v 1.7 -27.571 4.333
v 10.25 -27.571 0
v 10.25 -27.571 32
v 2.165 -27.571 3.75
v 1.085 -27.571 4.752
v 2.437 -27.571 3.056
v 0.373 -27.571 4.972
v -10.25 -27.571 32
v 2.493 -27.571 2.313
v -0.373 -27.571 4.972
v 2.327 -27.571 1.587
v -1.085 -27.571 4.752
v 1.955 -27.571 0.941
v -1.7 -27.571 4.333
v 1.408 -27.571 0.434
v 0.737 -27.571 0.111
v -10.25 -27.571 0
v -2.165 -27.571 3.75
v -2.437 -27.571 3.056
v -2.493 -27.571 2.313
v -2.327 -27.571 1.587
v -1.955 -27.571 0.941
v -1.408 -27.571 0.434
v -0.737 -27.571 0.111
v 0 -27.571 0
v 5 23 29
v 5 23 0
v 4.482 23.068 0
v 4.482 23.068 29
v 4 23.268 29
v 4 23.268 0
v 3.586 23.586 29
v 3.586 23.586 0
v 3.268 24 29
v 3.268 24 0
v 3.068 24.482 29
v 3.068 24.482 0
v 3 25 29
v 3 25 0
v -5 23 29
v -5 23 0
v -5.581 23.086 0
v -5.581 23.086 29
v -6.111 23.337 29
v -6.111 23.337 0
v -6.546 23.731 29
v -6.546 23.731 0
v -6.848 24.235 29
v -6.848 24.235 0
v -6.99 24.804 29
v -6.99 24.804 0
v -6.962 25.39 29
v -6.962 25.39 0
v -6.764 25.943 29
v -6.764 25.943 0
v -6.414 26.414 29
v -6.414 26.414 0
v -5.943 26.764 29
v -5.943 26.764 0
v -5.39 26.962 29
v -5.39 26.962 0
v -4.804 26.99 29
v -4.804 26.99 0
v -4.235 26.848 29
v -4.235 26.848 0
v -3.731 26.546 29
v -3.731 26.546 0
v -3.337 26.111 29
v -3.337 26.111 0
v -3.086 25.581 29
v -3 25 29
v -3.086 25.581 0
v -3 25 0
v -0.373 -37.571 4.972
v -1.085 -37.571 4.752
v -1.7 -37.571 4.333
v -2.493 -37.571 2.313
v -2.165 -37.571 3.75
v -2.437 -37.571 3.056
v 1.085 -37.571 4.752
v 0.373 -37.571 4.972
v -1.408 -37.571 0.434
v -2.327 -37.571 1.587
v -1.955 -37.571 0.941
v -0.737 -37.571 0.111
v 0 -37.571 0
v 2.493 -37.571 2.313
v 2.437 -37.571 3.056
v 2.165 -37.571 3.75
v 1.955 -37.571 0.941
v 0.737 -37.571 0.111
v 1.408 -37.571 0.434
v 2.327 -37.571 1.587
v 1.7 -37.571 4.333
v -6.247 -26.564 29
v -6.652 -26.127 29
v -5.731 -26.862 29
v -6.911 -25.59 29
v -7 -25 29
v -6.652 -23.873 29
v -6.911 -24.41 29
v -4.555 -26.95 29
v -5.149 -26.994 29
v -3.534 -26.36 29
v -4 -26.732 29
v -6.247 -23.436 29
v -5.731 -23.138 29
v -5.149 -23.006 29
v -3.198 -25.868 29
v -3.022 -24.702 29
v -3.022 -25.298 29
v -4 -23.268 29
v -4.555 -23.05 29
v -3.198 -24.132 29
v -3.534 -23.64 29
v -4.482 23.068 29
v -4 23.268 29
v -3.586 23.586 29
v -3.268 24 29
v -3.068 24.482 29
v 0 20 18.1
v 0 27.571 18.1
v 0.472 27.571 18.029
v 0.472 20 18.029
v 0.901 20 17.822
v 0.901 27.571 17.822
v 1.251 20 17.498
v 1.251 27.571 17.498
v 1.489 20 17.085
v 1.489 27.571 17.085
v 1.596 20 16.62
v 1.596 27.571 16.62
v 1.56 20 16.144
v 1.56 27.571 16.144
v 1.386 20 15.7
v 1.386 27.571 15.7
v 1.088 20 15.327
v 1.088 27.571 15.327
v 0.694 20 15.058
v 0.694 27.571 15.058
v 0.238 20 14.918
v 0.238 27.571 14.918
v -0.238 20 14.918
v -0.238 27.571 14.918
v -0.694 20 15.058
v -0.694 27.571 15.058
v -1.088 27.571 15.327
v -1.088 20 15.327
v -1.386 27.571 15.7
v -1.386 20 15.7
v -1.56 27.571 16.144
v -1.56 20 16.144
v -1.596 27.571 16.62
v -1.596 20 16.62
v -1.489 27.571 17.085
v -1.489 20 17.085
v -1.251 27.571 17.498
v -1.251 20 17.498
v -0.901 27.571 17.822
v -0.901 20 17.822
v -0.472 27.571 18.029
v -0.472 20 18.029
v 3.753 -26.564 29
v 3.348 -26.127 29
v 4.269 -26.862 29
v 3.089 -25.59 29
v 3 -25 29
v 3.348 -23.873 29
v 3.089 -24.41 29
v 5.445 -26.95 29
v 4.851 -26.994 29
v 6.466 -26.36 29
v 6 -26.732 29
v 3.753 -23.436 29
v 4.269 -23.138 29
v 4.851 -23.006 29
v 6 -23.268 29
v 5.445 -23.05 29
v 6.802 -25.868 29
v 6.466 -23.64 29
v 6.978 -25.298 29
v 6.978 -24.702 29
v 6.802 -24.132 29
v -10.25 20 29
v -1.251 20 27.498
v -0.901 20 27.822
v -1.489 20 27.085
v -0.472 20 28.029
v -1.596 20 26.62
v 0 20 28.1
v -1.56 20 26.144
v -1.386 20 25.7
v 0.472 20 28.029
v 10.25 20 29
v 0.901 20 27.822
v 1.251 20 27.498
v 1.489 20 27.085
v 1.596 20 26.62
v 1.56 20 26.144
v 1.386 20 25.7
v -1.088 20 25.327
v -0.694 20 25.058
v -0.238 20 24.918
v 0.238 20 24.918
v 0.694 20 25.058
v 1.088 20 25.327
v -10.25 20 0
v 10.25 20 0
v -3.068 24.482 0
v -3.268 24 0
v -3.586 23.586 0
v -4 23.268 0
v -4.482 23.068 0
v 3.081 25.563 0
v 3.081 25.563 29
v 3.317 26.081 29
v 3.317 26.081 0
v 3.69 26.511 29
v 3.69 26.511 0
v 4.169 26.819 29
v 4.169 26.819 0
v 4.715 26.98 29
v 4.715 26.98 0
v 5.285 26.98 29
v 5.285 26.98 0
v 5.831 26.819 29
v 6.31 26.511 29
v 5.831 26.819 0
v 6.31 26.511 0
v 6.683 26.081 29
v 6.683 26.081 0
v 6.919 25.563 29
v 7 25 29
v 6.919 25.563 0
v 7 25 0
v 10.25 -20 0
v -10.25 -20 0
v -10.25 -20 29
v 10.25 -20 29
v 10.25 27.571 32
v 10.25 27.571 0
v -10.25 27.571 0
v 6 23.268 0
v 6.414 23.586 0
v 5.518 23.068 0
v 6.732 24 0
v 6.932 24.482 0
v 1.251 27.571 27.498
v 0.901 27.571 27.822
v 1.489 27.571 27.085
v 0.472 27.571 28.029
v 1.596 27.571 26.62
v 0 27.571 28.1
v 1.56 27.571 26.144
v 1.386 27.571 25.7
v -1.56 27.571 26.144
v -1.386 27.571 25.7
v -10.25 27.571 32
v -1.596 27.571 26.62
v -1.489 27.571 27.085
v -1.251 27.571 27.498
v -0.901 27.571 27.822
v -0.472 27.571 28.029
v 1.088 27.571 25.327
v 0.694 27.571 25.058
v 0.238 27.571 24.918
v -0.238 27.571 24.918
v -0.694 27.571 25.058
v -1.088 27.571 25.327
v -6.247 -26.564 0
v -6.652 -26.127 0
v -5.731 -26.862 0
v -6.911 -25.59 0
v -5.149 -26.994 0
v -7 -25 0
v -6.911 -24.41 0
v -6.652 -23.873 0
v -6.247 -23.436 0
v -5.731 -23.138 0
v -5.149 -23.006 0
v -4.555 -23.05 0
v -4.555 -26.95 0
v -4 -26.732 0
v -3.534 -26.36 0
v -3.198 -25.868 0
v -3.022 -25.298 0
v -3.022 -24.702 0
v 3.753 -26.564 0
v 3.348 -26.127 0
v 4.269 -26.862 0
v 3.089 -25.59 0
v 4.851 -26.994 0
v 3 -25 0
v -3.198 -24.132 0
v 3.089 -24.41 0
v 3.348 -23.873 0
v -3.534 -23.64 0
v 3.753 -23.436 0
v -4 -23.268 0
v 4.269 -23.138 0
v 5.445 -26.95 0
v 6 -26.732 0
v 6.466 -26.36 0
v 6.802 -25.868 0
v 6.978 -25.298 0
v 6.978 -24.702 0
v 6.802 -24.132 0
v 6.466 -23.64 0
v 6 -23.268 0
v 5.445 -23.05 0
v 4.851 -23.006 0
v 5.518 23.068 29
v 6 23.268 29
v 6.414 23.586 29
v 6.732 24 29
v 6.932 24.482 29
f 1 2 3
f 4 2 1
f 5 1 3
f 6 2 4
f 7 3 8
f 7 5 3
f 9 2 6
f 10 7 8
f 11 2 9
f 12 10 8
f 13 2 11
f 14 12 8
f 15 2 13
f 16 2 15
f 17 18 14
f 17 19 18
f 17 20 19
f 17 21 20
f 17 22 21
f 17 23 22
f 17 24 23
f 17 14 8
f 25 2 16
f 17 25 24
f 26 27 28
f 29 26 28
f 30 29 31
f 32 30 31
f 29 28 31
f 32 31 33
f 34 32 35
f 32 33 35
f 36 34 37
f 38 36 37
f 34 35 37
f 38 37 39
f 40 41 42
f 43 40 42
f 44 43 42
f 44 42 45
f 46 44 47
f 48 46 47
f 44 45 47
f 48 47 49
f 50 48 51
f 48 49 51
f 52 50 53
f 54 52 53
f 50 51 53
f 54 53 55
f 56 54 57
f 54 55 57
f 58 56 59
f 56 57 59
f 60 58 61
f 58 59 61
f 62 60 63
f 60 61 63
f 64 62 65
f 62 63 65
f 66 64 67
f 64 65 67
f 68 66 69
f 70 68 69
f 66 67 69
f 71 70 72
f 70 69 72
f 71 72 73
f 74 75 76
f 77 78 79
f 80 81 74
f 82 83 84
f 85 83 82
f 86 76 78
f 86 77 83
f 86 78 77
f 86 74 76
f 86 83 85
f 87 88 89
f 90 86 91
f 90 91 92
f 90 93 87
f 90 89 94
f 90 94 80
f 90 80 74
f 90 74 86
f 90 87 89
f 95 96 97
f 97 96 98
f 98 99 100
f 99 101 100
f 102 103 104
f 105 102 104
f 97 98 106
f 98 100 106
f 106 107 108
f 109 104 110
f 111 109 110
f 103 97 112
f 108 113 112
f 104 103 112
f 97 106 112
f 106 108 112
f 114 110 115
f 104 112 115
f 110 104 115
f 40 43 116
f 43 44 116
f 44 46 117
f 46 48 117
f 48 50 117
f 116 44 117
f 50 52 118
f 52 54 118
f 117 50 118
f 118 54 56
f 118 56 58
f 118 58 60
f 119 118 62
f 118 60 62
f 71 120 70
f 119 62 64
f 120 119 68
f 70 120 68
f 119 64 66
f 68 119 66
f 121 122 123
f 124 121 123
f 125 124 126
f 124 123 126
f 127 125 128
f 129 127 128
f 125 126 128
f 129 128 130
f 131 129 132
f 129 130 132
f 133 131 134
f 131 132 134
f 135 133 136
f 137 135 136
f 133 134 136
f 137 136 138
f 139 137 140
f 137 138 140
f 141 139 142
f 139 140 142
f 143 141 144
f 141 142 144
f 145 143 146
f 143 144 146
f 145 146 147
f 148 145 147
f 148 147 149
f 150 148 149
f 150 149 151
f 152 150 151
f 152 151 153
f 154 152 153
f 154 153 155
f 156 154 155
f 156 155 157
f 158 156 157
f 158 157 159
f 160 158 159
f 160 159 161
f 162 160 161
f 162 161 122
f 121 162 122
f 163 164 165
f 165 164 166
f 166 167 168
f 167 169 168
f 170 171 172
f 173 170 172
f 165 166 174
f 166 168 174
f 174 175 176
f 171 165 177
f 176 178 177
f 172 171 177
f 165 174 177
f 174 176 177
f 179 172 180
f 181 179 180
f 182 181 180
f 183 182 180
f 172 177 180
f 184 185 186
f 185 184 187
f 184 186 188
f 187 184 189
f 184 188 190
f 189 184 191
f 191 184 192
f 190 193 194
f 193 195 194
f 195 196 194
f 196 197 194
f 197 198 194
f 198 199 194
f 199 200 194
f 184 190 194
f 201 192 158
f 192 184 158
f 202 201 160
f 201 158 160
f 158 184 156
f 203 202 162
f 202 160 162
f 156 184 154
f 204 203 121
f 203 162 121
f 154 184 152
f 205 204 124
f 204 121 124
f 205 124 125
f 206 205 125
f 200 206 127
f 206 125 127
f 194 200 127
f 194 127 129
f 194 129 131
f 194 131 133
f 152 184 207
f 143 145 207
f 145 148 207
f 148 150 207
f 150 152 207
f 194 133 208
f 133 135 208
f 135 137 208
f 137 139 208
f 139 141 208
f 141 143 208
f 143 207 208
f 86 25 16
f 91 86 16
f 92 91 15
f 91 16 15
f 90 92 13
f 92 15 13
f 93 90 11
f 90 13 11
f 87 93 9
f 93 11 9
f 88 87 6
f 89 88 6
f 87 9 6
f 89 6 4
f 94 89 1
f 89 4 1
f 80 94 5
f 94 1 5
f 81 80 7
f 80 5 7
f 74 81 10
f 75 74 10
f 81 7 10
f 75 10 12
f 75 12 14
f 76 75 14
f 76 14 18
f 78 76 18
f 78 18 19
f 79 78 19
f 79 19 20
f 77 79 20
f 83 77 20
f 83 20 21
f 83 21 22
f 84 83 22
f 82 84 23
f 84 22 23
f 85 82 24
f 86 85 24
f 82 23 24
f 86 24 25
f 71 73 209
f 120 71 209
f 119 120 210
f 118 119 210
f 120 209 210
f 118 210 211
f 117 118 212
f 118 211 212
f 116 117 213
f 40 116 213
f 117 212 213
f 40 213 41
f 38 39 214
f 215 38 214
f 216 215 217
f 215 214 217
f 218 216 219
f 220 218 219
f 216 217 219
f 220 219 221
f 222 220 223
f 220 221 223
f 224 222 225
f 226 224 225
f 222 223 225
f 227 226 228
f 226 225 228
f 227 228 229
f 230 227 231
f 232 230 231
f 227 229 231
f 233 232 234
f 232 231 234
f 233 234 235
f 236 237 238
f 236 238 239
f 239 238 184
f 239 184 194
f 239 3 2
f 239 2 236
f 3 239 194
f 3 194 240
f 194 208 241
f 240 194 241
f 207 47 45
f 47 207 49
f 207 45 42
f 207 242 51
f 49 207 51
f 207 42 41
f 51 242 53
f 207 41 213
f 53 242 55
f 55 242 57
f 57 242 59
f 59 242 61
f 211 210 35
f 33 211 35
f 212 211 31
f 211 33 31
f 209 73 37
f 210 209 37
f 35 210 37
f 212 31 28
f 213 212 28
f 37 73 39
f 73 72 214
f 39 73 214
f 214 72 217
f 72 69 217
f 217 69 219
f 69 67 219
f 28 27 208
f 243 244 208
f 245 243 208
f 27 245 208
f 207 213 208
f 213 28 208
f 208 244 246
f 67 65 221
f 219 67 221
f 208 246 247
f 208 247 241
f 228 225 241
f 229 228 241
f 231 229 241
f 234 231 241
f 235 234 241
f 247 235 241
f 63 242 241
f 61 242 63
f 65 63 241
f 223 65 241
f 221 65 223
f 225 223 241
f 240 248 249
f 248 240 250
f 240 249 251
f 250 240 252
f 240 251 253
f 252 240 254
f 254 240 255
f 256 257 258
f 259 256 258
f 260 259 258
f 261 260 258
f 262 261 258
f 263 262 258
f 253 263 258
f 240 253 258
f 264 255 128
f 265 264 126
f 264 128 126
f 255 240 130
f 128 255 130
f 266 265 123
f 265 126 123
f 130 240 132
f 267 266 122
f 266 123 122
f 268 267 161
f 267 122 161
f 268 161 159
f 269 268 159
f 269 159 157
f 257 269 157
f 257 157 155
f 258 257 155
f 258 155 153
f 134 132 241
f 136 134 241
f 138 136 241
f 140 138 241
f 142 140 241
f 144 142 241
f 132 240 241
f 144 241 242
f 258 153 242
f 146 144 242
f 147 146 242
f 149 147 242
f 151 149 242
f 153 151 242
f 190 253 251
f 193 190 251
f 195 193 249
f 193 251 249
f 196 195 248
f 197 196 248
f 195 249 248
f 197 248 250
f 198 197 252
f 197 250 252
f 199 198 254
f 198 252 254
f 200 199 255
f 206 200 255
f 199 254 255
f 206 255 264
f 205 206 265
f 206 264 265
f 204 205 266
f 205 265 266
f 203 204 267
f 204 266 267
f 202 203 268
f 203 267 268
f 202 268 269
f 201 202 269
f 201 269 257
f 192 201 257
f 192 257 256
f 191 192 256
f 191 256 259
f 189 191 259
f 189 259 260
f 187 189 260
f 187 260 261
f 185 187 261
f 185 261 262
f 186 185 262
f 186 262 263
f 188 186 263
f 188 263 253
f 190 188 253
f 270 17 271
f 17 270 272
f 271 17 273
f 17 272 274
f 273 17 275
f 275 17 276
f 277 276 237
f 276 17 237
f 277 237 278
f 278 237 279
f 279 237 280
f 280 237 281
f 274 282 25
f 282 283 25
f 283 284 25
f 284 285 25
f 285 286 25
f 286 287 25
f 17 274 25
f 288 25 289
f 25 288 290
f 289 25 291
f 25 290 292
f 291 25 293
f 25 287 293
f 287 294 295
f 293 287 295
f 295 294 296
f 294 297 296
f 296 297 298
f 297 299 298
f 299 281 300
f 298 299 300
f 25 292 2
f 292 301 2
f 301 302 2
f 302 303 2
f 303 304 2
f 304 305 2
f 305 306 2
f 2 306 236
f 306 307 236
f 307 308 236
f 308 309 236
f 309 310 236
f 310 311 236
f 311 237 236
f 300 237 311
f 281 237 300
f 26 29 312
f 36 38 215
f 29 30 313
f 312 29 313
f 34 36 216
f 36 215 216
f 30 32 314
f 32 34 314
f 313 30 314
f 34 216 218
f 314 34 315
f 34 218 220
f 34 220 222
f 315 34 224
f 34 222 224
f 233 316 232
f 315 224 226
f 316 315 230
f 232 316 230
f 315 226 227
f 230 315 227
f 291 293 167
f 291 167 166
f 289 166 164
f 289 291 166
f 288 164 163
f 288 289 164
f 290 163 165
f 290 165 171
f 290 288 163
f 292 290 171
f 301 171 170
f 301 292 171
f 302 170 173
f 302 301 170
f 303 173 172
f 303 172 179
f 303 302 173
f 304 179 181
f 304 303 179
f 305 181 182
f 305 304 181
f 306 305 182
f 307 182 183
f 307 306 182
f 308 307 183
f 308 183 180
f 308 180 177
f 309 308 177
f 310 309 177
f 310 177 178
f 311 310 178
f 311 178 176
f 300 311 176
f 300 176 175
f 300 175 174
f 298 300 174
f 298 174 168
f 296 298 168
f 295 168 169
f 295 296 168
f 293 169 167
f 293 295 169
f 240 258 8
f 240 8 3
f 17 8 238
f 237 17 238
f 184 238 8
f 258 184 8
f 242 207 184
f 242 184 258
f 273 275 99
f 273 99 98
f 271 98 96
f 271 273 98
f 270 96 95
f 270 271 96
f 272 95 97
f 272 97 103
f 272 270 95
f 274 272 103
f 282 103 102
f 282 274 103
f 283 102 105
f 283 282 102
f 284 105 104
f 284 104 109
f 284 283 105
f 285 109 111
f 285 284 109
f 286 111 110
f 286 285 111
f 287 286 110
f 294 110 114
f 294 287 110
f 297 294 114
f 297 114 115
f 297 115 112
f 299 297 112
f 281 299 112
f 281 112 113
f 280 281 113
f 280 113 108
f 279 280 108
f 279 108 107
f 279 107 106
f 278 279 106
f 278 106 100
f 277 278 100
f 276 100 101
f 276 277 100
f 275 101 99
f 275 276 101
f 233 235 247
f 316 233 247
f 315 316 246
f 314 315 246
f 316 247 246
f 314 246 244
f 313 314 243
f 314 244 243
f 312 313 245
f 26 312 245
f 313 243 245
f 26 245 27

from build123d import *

# Parameters (mm, degrees)
SKETCH_1_W          = 20.5
SKETCH_1_H          = 15.141704846
SKETCH_1_R          = 2
EXTRUDE_1_DEPTH     = 29
SKETCH_2_W          = 20.5
SKETCH_2_H          = 70.283409692
EXTRUDE_2_DEPTH     = 3
SKETCH_3_W          = 20.5
SKETCH_3_H          = 7.570852423
CUT_EXTRUDE_1_DEPTH = 49.621002864
SKETCH_5_R          = 2.5
EXTRUDE_3_DEPTH     = 10
CUT_EXTRUDE_2_REACH = 75.297
SKETCH_8_R          = 1.6


with BuildPart() as part:
    # 草图1 → 凸台-拉伸1 (new body)
    # profile 1 of 3: a face of its own
    with BuildSketch(Plane.XY):
        with BuildLine():
            Line((-10.25, 35.141704846), (-10.25, 20))
            Line((-10.25, 20), (-5, 20))
            Line((-5, 20), (-5, 23))
            ThreePointArc((-5, 23), (-6.414213562, 26.414213562), (-3, 25))
            Line((-3, 25), (3, 25))
            ThreePointArc((3, 25), (5, 27), (7, 25))
            ThreePointArc((7, 25), (6.414213562, 23.585786438), (5, 23))
            Line((5, 23), (5, 20))
            Line((5, 20), (10.25, 20))
            Line((10.25, 20), (10.25, 35.141704846))
            Line((10.25, 35.141704846), (-10.25, 35.141704846))
        make_face()
    # profile 2 of 3: a face of its own
    with BuildSketch(Plane.XY):
        with Locations((0, -27.570852423)):
            Rectangle(SKETCH_1_W, SKETCH_1_H)
        with Locations(Location((-5, -25, 0), (0, 0, 180))):
            Circle(SKETCH_1_R, mode=Mode.SUBTRACT)
        with Locations(Location((5, -25, 0), (0, 0, 180))):
            Circle(SKETCH_1_R, mode=Mode.SUBTRACT)
    # profile 3 of 3: a face of its own
    with BuildSketch(Plane.XY):
        with BuildLine():
            Line((-5, 23), (-5, 20))
            Line((-5, 20), (5, 20))
            Line((5, 20), (5, 23))
            ThreePointArc((5, 23), (3.585786438, 23.585786438), (3, 25))
            Line((3, 25), (-3, 25))
            ThreePointArc((-3, 25), (-3.585786438, 23.585786438), (-5, 23))
        make_face()
    extrude(amount=EXTRUDE_1_DEPTH)

    # 草图2 → 凸台-拉伸2 (add)
    with BuildSketch(Plane.XY.offset(29)):
        Rectangle(SKETCH_2_W, SKETCH_2_H)
    extrude(amount=EXTRUDE_2_DEPTH)

    # 草图3 → 切除-拉伸1 (cut, through all)
    with BuildSketch(Plane(origin=(0, 0, 0), x_dir=(-1, 0, 0), z_dir=(0, 0, -1))):
        with Locations((0, -31.356278635)):
            Rectangle(SKETCH_3_W, SKETCH_3_H)
        with Locations((0, 31.356278635)):
            Rectangle(SKETCH_3_W, SKETCH_3_H)
    extrude(amount=-CUT_EXTRUDE_1_DEPTH, mode=Mode.SUBTRACT)

    # 草图5 → 凸台-拉伸3 (add)
    with BuildSketch(Plane.XZ.offset(27.570852423)):
        with Locations(Location((0, 2.5, 0), (0, 0, 270))):
            Circle(SKETCH_5_R)
    extrude(amount=EXTRUDE_3_DEPTH)

    # 草图8 → 切除-拉伸2 (cut, up to next)
    with BuildSketch(Plane(origin=(0, 27.570852423, 0), x_dir=(1, 0, 0), z_dir=(0, 1, 0)), mode=Mode.PRIVATE) as cut_extrude_2_sk1:
        with Locations(Location((0, -16.5, 0), (0, 0, 270))):
            Circle(SKETCH_8_R)
    cut_extrude_2_tool1 = extrude(cut_extrude_2_sk1.sketch, amount=-CUT_EXTRUDE_2_REACH, mode=Mode.PRIVATE) & part.part
    # 草图8 → 切除-拉伸2 (cut, up to next)
    with BuildSketch(Plane(origin=(0, 27.570852423, 0), x_dir=(1, 0, 0), z_dir=(0, 1, 0)), mode=Mode.PRIVATE) as cut_extrude_2_sk2:
        with Locations(Location((0, -26.5, 0), (0, 0, 270))):
            Circle(SKETCH_8_R)
    cut_extrude_2_tool2 = extrude(cut_extrude_2_sk2.sketch, amount=-CUT_EXTRUDE_2_REACH, mode=Mode.PRIVATE) & part.part
    add(cut_extrude_2_tool1.solids().sort_by_distance((0, 27.570852, 16.5))[0], mode=Mode.SUBTRACT)
    add(cut_extrude_2_tool2.solids().sort_by_distance((0, 27.570852, 26.5))[0], mode=Mode.SUBTRACT)


solid = part.part
